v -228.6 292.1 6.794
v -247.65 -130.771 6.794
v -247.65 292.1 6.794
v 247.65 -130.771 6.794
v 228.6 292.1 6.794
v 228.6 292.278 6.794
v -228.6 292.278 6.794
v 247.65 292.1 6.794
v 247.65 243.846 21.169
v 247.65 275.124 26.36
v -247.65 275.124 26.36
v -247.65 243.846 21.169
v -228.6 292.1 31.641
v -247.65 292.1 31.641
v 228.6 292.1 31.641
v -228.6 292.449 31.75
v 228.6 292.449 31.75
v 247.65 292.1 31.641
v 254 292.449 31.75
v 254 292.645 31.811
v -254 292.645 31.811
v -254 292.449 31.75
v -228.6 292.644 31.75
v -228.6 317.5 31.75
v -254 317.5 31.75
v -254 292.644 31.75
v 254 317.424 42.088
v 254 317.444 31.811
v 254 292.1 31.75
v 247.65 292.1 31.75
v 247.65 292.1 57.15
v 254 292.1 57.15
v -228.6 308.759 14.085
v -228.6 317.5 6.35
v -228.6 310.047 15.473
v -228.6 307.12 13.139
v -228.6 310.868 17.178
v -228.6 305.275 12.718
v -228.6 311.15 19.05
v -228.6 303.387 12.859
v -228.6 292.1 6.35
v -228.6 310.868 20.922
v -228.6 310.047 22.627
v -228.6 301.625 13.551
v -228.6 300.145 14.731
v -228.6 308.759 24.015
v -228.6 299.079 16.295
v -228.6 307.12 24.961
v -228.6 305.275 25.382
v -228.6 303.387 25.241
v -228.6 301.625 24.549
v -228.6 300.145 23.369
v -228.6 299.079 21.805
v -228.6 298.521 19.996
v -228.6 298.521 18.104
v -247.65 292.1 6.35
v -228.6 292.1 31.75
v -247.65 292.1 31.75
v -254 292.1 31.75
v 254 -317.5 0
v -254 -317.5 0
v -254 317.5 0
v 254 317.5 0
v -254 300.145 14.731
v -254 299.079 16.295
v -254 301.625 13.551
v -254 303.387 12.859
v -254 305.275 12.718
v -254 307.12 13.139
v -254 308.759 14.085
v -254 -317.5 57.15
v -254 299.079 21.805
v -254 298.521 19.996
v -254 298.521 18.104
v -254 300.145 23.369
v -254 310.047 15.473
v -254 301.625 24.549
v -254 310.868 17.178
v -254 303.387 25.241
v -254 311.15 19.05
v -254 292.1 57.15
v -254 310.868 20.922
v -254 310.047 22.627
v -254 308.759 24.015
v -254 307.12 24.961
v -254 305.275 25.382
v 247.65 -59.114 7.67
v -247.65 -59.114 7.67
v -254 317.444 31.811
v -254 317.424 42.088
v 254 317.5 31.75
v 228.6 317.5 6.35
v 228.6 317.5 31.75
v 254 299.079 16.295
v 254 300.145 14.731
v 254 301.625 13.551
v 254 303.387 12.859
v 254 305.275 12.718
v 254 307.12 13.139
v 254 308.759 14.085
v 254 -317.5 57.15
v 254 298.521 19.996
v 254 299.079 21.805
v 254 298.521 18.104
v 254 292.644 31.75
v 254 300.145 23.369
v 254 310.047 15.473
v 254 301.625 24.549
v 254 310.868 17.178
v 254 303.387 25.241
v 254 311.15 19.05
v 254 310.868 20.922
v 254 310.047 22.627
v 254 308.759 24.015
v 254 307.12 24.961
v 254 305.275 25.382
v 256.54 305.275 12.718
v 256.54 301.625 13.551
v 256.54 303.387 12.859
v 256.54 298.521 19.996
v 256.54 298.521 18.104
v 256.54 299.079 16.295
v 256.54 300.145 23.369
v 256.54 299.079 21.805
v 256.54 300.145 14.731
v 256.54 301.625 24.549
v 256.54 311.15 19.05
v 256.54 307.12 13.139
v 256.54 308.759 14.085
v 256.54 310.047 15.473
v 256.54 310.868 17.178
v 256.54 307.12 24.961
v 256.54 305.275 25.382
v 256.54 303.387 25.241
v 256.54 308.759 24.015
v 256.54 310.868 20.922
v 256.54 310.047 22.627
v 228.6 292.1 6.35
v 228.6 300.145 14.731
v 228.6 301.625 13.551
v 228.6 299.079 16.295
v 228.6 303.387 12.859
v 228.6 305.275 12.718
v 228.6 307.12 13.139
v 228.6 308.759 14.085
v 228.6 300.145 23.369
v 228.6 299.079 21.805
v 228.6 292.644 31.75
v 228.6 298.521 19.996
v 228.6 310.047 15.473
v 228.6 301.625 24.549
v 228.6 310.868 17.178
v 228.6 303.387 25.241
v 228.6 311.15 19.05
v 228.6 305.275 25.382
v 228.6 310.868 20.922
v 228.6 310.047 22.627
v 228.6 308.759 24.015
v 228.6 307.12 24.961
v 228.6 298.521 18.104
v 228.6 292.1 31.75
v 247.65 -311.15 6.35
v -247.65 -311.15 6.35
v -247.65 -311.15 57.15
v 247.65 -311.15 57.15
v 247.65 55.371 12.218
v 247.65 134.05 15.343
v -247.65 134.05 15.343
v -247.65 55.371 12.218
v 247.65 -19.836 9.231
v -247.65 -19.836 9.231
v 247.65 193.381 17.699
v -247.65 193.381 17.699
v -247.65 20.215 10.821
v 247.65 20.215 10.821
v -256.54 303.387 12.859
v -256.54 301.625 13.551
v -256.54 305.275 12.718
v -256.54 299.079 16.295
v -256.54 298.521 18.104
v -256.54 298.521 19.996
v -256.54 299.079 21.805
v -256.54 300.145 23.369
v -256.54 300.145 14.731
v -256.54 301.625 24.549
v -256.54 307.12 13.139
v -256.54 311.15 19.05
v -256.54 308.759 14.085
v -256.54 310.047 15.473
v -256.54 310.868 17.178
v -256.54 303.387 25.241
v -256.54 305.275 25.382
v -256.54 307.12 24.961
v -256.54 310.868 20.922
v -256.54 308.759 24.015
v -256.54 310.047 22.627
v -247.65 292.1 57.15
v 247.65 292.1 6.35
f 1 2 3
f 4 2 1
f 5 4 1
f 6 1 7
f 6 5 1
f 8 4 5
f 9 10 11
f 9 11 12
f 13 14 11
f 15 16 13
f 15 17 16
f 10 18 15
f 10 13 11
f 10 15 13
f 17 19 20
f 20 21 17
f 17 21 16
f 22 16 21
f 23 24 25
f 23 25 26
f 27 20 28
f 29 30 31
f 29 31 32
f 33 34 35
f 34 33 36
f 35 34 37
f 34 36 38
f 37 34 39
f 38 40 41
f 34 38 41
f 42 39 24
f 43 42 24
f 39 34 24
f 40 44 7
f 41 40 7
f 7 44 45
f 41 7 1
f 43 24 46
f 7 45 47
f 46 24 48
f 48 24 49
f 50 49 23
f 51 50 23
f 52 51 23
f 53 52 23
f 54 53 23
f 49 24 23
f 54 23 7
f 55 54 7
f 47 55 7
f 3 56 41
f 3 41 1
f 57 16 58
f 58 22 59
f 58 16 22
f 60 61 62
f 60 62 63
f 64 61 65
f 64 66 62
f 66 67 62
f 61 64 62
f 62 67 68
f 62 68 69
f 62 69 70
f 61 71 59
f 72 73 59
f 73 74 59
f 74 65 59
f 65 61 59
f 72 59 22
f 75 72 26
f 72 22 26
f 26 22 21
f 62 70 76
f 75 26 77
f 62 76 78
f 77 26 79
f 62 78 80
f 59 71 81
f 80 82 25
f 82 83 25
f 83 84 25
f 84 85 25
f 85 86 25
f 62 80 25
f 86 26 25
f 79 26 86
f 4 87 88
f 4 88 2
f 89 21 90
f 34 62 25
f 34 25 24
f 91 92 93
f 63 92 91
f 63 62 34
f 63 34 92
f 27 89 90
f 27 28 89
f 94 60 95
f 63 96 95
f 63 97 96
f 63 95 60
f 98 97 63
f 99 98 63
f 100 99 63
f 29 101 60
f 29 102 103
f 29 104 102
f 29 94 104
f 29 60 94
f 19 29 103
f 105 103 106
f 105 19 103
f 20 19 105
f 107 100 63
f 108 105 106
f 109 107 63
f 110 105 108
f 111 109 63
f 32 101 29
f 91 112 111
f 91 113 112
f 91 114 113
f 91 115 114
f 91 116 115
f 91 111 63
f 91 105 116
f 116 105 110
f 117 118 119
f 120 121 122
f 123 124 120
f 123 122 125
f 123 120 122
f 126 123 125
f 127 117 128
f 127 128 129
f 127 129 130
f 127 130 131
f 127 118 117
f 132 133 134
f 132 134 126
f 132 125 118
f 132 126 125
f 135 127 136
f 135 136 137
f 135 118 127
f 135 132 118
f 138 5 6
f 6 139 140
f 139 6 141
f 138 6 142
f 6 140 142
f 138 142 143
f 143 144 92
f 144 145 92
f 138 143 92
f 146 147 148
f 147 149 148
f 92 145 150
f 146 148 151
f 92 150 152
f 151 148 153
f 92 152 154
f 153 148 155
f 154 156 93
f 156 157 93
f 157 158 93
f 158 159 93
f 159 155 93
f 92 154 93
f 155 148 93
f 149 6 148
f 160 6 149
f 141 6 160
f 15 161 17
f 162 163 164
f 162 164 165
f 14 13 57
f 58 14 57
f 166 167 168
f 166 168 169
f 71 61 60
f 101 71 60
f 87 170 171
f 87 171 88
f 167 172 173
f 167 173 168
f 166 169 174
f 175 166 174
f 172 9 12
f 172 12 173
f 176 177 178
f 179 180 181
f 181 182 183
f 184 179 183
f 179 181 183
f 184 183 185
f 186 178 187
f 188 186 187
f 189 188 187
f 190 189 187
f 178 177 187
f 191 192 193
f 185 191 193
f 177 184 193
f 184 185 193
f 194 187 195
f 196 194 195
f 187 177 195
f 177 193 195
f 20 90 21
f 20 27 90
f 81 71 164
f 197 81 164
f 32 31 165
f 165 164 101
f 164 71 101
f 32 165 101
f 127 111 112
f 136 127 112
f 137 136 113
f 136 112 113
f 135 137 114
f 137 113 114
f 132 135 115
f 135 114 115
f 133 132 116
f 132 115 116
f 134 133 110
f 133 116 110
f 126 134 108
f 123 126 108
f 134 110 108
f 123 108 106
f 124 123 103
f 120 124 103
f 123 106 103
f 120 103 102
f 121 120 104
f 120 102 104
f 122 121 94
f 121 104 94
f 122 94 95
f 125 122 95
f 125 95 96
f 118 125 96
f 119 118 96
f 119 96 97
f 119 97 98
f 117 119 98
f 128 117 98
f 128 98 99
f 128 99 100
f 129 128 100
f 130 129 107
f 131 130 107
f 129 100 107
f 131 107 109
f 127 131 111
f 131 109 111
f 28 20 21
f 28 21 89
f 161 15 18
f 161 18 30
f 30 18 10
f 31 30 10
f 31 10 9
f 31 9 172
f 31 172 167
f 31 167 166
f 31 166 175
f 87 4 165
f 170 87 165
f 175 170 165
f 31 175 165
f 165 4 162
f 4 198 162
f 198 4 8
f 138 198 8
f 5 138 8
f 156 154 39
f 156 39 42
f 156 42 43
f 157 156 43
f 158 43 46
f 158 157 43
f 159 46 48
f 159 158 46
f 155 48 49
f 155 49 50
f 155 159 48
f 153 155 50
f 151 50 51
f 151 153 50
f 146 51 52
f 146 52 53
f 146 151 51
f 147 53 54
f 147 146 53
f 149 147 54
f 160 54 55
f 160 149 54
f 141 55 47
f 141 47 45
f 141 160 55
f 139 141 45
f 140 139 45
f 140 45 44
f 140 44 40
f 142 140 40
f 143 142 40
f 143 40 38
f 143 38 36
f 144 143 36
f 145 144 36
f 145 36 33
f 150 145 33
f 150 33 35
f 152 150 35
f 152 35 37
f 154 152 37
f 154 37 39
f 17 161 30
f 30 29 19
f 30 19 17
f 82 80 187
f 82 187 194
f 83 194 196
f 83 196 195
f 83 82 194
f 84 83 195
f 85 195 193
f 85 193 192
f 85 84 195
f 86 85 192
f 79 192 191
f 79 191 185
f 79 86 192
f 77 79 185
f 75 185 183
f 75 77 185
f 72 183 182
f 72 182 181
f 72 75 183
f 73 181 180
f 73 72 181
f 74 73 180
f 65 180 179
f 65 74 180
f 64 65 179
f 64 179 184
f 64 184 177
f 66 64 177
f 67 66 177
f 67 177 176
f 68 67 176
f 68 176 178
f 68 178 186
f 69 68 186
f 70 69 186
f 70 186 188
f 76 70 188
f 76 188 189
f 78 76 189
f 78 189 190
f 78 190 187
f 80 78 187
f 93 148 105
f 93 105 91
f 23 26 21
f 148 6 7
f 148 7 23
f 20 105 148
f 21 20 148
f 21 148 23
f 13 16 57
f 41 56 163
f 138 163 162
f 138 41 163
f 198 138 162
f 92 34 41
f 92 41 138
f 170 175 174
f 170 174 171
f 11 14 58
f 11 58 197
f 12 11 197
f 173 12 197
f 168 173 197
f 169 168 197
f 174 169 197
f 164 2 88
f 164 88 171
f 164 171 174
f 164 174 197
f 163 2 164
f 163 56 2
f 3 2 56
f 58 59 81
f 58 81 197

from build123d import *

# Parameters (mm, degrees)
F0_W          = 508
F0_H          = 635
F1_DEPTH      = 6.35
F2_W          = 25.4
F2_H          = 31.75
F3_DEPTH      = 25.4
F4_W          = 25.4
F4_H          = 31.75
F5_DEPTH      = 25.4
F6_R          = 6.35
F7_DEPTH      = 2.54
F7_DEPTH_BACK = 510.54
F9_DEPTH      = 254
F9_DEPTH_BACK = 254
F10_W         = 6.35
F10_H         = 6.35
F10_W_2       = 495.3
F10_H_2       = 603.25
F11_DEPTH     = 57.15


with BuildPart() as f1:
    # F0 (on Top) → F1 (new body)
    with BuildSketch(Plane.XY):
        Rectangle(F0_W, F0_H)
    extrude(amount=F1_DEPTH)

    # F2 (on face) → F3 (join)
    with BuildSketch(Plane.YZ.offset(254)):
        with Locations((304.8, 15.875)):
            Rectangle(F2_W, F2_H)
    extrude(amount=-F3_DEPTH)

    # F4 (on face) → F5 (join)
    with BuildSketch(Plane(origin=(-254, 0, 0), x_dir=(0, -1, 0), z_dir=(-1, 0, 0))):
        with Locations((-304.8, 15.875)):
            Rectangle(F4_W, F4_H)
    extrude(amount=-F5_DEPTH)

    # F6 (on face) → F7 (join, two sides)
    with BuildSketch(Plane.YZ.offset(254)) as f7_sk:
        with Locations((304.8, 19.05)):
            Circle(F6_R)
    extrude(amount=F7_DEPTH)
    extrude(f7_sk.sketch, amount=-F7_DEPTH_BACK)

    # F8 (on Right) → F9 (join, two sides)
    with BuildSketch(Plane.YZ) as f9_sk:
        Polygon((-59.114292, 7.670393), (-130.770952, 6.794375), (292.277932, 6.794375), (292.644948, 31.810883), (275.124073, 26.359947), (243.846089, 21.16858), (193.380921, 17.69941), (134.050472, 15.342826), (55.370512, 12.217687), (20.214967, 10.821322), (-19.836184, 9.230505), align=None)
        Polygon((317.424387, 42.087749), (292.644948, 31.810883), (317.443877, 31.810883), align=None)
    extrude(amount=F9_DEPTH)
    extrude(f9_sk.sketch, amount=-F9_DEPTH_BACK)

    # F10 (on face) → F11 (join)
    with BuildSketch(Plane(origin=(0, 0, 0), x_dir=(1, 0, 0), z_dir=(0, 0, -1))):
        with Locations((-250.825, 314.325)):
            Rectangle(F10_W, F10_H)
        with Locations((0, 314.325)):
            Rectangle(F10_W_2, F10_H)
        with Locations((-250.825, 9.525)):
            Rectangle(F10_W, F10_H_2)
        with Locations((250.825, 314.325)):
            Rectangle(F10_W, F10_H)
        with Locations((250.825, 9.525)):
            Rectangle(F10_W, F10_H_2)
    extrude(amount=-F11_DEPTH)


solid = f1.part
